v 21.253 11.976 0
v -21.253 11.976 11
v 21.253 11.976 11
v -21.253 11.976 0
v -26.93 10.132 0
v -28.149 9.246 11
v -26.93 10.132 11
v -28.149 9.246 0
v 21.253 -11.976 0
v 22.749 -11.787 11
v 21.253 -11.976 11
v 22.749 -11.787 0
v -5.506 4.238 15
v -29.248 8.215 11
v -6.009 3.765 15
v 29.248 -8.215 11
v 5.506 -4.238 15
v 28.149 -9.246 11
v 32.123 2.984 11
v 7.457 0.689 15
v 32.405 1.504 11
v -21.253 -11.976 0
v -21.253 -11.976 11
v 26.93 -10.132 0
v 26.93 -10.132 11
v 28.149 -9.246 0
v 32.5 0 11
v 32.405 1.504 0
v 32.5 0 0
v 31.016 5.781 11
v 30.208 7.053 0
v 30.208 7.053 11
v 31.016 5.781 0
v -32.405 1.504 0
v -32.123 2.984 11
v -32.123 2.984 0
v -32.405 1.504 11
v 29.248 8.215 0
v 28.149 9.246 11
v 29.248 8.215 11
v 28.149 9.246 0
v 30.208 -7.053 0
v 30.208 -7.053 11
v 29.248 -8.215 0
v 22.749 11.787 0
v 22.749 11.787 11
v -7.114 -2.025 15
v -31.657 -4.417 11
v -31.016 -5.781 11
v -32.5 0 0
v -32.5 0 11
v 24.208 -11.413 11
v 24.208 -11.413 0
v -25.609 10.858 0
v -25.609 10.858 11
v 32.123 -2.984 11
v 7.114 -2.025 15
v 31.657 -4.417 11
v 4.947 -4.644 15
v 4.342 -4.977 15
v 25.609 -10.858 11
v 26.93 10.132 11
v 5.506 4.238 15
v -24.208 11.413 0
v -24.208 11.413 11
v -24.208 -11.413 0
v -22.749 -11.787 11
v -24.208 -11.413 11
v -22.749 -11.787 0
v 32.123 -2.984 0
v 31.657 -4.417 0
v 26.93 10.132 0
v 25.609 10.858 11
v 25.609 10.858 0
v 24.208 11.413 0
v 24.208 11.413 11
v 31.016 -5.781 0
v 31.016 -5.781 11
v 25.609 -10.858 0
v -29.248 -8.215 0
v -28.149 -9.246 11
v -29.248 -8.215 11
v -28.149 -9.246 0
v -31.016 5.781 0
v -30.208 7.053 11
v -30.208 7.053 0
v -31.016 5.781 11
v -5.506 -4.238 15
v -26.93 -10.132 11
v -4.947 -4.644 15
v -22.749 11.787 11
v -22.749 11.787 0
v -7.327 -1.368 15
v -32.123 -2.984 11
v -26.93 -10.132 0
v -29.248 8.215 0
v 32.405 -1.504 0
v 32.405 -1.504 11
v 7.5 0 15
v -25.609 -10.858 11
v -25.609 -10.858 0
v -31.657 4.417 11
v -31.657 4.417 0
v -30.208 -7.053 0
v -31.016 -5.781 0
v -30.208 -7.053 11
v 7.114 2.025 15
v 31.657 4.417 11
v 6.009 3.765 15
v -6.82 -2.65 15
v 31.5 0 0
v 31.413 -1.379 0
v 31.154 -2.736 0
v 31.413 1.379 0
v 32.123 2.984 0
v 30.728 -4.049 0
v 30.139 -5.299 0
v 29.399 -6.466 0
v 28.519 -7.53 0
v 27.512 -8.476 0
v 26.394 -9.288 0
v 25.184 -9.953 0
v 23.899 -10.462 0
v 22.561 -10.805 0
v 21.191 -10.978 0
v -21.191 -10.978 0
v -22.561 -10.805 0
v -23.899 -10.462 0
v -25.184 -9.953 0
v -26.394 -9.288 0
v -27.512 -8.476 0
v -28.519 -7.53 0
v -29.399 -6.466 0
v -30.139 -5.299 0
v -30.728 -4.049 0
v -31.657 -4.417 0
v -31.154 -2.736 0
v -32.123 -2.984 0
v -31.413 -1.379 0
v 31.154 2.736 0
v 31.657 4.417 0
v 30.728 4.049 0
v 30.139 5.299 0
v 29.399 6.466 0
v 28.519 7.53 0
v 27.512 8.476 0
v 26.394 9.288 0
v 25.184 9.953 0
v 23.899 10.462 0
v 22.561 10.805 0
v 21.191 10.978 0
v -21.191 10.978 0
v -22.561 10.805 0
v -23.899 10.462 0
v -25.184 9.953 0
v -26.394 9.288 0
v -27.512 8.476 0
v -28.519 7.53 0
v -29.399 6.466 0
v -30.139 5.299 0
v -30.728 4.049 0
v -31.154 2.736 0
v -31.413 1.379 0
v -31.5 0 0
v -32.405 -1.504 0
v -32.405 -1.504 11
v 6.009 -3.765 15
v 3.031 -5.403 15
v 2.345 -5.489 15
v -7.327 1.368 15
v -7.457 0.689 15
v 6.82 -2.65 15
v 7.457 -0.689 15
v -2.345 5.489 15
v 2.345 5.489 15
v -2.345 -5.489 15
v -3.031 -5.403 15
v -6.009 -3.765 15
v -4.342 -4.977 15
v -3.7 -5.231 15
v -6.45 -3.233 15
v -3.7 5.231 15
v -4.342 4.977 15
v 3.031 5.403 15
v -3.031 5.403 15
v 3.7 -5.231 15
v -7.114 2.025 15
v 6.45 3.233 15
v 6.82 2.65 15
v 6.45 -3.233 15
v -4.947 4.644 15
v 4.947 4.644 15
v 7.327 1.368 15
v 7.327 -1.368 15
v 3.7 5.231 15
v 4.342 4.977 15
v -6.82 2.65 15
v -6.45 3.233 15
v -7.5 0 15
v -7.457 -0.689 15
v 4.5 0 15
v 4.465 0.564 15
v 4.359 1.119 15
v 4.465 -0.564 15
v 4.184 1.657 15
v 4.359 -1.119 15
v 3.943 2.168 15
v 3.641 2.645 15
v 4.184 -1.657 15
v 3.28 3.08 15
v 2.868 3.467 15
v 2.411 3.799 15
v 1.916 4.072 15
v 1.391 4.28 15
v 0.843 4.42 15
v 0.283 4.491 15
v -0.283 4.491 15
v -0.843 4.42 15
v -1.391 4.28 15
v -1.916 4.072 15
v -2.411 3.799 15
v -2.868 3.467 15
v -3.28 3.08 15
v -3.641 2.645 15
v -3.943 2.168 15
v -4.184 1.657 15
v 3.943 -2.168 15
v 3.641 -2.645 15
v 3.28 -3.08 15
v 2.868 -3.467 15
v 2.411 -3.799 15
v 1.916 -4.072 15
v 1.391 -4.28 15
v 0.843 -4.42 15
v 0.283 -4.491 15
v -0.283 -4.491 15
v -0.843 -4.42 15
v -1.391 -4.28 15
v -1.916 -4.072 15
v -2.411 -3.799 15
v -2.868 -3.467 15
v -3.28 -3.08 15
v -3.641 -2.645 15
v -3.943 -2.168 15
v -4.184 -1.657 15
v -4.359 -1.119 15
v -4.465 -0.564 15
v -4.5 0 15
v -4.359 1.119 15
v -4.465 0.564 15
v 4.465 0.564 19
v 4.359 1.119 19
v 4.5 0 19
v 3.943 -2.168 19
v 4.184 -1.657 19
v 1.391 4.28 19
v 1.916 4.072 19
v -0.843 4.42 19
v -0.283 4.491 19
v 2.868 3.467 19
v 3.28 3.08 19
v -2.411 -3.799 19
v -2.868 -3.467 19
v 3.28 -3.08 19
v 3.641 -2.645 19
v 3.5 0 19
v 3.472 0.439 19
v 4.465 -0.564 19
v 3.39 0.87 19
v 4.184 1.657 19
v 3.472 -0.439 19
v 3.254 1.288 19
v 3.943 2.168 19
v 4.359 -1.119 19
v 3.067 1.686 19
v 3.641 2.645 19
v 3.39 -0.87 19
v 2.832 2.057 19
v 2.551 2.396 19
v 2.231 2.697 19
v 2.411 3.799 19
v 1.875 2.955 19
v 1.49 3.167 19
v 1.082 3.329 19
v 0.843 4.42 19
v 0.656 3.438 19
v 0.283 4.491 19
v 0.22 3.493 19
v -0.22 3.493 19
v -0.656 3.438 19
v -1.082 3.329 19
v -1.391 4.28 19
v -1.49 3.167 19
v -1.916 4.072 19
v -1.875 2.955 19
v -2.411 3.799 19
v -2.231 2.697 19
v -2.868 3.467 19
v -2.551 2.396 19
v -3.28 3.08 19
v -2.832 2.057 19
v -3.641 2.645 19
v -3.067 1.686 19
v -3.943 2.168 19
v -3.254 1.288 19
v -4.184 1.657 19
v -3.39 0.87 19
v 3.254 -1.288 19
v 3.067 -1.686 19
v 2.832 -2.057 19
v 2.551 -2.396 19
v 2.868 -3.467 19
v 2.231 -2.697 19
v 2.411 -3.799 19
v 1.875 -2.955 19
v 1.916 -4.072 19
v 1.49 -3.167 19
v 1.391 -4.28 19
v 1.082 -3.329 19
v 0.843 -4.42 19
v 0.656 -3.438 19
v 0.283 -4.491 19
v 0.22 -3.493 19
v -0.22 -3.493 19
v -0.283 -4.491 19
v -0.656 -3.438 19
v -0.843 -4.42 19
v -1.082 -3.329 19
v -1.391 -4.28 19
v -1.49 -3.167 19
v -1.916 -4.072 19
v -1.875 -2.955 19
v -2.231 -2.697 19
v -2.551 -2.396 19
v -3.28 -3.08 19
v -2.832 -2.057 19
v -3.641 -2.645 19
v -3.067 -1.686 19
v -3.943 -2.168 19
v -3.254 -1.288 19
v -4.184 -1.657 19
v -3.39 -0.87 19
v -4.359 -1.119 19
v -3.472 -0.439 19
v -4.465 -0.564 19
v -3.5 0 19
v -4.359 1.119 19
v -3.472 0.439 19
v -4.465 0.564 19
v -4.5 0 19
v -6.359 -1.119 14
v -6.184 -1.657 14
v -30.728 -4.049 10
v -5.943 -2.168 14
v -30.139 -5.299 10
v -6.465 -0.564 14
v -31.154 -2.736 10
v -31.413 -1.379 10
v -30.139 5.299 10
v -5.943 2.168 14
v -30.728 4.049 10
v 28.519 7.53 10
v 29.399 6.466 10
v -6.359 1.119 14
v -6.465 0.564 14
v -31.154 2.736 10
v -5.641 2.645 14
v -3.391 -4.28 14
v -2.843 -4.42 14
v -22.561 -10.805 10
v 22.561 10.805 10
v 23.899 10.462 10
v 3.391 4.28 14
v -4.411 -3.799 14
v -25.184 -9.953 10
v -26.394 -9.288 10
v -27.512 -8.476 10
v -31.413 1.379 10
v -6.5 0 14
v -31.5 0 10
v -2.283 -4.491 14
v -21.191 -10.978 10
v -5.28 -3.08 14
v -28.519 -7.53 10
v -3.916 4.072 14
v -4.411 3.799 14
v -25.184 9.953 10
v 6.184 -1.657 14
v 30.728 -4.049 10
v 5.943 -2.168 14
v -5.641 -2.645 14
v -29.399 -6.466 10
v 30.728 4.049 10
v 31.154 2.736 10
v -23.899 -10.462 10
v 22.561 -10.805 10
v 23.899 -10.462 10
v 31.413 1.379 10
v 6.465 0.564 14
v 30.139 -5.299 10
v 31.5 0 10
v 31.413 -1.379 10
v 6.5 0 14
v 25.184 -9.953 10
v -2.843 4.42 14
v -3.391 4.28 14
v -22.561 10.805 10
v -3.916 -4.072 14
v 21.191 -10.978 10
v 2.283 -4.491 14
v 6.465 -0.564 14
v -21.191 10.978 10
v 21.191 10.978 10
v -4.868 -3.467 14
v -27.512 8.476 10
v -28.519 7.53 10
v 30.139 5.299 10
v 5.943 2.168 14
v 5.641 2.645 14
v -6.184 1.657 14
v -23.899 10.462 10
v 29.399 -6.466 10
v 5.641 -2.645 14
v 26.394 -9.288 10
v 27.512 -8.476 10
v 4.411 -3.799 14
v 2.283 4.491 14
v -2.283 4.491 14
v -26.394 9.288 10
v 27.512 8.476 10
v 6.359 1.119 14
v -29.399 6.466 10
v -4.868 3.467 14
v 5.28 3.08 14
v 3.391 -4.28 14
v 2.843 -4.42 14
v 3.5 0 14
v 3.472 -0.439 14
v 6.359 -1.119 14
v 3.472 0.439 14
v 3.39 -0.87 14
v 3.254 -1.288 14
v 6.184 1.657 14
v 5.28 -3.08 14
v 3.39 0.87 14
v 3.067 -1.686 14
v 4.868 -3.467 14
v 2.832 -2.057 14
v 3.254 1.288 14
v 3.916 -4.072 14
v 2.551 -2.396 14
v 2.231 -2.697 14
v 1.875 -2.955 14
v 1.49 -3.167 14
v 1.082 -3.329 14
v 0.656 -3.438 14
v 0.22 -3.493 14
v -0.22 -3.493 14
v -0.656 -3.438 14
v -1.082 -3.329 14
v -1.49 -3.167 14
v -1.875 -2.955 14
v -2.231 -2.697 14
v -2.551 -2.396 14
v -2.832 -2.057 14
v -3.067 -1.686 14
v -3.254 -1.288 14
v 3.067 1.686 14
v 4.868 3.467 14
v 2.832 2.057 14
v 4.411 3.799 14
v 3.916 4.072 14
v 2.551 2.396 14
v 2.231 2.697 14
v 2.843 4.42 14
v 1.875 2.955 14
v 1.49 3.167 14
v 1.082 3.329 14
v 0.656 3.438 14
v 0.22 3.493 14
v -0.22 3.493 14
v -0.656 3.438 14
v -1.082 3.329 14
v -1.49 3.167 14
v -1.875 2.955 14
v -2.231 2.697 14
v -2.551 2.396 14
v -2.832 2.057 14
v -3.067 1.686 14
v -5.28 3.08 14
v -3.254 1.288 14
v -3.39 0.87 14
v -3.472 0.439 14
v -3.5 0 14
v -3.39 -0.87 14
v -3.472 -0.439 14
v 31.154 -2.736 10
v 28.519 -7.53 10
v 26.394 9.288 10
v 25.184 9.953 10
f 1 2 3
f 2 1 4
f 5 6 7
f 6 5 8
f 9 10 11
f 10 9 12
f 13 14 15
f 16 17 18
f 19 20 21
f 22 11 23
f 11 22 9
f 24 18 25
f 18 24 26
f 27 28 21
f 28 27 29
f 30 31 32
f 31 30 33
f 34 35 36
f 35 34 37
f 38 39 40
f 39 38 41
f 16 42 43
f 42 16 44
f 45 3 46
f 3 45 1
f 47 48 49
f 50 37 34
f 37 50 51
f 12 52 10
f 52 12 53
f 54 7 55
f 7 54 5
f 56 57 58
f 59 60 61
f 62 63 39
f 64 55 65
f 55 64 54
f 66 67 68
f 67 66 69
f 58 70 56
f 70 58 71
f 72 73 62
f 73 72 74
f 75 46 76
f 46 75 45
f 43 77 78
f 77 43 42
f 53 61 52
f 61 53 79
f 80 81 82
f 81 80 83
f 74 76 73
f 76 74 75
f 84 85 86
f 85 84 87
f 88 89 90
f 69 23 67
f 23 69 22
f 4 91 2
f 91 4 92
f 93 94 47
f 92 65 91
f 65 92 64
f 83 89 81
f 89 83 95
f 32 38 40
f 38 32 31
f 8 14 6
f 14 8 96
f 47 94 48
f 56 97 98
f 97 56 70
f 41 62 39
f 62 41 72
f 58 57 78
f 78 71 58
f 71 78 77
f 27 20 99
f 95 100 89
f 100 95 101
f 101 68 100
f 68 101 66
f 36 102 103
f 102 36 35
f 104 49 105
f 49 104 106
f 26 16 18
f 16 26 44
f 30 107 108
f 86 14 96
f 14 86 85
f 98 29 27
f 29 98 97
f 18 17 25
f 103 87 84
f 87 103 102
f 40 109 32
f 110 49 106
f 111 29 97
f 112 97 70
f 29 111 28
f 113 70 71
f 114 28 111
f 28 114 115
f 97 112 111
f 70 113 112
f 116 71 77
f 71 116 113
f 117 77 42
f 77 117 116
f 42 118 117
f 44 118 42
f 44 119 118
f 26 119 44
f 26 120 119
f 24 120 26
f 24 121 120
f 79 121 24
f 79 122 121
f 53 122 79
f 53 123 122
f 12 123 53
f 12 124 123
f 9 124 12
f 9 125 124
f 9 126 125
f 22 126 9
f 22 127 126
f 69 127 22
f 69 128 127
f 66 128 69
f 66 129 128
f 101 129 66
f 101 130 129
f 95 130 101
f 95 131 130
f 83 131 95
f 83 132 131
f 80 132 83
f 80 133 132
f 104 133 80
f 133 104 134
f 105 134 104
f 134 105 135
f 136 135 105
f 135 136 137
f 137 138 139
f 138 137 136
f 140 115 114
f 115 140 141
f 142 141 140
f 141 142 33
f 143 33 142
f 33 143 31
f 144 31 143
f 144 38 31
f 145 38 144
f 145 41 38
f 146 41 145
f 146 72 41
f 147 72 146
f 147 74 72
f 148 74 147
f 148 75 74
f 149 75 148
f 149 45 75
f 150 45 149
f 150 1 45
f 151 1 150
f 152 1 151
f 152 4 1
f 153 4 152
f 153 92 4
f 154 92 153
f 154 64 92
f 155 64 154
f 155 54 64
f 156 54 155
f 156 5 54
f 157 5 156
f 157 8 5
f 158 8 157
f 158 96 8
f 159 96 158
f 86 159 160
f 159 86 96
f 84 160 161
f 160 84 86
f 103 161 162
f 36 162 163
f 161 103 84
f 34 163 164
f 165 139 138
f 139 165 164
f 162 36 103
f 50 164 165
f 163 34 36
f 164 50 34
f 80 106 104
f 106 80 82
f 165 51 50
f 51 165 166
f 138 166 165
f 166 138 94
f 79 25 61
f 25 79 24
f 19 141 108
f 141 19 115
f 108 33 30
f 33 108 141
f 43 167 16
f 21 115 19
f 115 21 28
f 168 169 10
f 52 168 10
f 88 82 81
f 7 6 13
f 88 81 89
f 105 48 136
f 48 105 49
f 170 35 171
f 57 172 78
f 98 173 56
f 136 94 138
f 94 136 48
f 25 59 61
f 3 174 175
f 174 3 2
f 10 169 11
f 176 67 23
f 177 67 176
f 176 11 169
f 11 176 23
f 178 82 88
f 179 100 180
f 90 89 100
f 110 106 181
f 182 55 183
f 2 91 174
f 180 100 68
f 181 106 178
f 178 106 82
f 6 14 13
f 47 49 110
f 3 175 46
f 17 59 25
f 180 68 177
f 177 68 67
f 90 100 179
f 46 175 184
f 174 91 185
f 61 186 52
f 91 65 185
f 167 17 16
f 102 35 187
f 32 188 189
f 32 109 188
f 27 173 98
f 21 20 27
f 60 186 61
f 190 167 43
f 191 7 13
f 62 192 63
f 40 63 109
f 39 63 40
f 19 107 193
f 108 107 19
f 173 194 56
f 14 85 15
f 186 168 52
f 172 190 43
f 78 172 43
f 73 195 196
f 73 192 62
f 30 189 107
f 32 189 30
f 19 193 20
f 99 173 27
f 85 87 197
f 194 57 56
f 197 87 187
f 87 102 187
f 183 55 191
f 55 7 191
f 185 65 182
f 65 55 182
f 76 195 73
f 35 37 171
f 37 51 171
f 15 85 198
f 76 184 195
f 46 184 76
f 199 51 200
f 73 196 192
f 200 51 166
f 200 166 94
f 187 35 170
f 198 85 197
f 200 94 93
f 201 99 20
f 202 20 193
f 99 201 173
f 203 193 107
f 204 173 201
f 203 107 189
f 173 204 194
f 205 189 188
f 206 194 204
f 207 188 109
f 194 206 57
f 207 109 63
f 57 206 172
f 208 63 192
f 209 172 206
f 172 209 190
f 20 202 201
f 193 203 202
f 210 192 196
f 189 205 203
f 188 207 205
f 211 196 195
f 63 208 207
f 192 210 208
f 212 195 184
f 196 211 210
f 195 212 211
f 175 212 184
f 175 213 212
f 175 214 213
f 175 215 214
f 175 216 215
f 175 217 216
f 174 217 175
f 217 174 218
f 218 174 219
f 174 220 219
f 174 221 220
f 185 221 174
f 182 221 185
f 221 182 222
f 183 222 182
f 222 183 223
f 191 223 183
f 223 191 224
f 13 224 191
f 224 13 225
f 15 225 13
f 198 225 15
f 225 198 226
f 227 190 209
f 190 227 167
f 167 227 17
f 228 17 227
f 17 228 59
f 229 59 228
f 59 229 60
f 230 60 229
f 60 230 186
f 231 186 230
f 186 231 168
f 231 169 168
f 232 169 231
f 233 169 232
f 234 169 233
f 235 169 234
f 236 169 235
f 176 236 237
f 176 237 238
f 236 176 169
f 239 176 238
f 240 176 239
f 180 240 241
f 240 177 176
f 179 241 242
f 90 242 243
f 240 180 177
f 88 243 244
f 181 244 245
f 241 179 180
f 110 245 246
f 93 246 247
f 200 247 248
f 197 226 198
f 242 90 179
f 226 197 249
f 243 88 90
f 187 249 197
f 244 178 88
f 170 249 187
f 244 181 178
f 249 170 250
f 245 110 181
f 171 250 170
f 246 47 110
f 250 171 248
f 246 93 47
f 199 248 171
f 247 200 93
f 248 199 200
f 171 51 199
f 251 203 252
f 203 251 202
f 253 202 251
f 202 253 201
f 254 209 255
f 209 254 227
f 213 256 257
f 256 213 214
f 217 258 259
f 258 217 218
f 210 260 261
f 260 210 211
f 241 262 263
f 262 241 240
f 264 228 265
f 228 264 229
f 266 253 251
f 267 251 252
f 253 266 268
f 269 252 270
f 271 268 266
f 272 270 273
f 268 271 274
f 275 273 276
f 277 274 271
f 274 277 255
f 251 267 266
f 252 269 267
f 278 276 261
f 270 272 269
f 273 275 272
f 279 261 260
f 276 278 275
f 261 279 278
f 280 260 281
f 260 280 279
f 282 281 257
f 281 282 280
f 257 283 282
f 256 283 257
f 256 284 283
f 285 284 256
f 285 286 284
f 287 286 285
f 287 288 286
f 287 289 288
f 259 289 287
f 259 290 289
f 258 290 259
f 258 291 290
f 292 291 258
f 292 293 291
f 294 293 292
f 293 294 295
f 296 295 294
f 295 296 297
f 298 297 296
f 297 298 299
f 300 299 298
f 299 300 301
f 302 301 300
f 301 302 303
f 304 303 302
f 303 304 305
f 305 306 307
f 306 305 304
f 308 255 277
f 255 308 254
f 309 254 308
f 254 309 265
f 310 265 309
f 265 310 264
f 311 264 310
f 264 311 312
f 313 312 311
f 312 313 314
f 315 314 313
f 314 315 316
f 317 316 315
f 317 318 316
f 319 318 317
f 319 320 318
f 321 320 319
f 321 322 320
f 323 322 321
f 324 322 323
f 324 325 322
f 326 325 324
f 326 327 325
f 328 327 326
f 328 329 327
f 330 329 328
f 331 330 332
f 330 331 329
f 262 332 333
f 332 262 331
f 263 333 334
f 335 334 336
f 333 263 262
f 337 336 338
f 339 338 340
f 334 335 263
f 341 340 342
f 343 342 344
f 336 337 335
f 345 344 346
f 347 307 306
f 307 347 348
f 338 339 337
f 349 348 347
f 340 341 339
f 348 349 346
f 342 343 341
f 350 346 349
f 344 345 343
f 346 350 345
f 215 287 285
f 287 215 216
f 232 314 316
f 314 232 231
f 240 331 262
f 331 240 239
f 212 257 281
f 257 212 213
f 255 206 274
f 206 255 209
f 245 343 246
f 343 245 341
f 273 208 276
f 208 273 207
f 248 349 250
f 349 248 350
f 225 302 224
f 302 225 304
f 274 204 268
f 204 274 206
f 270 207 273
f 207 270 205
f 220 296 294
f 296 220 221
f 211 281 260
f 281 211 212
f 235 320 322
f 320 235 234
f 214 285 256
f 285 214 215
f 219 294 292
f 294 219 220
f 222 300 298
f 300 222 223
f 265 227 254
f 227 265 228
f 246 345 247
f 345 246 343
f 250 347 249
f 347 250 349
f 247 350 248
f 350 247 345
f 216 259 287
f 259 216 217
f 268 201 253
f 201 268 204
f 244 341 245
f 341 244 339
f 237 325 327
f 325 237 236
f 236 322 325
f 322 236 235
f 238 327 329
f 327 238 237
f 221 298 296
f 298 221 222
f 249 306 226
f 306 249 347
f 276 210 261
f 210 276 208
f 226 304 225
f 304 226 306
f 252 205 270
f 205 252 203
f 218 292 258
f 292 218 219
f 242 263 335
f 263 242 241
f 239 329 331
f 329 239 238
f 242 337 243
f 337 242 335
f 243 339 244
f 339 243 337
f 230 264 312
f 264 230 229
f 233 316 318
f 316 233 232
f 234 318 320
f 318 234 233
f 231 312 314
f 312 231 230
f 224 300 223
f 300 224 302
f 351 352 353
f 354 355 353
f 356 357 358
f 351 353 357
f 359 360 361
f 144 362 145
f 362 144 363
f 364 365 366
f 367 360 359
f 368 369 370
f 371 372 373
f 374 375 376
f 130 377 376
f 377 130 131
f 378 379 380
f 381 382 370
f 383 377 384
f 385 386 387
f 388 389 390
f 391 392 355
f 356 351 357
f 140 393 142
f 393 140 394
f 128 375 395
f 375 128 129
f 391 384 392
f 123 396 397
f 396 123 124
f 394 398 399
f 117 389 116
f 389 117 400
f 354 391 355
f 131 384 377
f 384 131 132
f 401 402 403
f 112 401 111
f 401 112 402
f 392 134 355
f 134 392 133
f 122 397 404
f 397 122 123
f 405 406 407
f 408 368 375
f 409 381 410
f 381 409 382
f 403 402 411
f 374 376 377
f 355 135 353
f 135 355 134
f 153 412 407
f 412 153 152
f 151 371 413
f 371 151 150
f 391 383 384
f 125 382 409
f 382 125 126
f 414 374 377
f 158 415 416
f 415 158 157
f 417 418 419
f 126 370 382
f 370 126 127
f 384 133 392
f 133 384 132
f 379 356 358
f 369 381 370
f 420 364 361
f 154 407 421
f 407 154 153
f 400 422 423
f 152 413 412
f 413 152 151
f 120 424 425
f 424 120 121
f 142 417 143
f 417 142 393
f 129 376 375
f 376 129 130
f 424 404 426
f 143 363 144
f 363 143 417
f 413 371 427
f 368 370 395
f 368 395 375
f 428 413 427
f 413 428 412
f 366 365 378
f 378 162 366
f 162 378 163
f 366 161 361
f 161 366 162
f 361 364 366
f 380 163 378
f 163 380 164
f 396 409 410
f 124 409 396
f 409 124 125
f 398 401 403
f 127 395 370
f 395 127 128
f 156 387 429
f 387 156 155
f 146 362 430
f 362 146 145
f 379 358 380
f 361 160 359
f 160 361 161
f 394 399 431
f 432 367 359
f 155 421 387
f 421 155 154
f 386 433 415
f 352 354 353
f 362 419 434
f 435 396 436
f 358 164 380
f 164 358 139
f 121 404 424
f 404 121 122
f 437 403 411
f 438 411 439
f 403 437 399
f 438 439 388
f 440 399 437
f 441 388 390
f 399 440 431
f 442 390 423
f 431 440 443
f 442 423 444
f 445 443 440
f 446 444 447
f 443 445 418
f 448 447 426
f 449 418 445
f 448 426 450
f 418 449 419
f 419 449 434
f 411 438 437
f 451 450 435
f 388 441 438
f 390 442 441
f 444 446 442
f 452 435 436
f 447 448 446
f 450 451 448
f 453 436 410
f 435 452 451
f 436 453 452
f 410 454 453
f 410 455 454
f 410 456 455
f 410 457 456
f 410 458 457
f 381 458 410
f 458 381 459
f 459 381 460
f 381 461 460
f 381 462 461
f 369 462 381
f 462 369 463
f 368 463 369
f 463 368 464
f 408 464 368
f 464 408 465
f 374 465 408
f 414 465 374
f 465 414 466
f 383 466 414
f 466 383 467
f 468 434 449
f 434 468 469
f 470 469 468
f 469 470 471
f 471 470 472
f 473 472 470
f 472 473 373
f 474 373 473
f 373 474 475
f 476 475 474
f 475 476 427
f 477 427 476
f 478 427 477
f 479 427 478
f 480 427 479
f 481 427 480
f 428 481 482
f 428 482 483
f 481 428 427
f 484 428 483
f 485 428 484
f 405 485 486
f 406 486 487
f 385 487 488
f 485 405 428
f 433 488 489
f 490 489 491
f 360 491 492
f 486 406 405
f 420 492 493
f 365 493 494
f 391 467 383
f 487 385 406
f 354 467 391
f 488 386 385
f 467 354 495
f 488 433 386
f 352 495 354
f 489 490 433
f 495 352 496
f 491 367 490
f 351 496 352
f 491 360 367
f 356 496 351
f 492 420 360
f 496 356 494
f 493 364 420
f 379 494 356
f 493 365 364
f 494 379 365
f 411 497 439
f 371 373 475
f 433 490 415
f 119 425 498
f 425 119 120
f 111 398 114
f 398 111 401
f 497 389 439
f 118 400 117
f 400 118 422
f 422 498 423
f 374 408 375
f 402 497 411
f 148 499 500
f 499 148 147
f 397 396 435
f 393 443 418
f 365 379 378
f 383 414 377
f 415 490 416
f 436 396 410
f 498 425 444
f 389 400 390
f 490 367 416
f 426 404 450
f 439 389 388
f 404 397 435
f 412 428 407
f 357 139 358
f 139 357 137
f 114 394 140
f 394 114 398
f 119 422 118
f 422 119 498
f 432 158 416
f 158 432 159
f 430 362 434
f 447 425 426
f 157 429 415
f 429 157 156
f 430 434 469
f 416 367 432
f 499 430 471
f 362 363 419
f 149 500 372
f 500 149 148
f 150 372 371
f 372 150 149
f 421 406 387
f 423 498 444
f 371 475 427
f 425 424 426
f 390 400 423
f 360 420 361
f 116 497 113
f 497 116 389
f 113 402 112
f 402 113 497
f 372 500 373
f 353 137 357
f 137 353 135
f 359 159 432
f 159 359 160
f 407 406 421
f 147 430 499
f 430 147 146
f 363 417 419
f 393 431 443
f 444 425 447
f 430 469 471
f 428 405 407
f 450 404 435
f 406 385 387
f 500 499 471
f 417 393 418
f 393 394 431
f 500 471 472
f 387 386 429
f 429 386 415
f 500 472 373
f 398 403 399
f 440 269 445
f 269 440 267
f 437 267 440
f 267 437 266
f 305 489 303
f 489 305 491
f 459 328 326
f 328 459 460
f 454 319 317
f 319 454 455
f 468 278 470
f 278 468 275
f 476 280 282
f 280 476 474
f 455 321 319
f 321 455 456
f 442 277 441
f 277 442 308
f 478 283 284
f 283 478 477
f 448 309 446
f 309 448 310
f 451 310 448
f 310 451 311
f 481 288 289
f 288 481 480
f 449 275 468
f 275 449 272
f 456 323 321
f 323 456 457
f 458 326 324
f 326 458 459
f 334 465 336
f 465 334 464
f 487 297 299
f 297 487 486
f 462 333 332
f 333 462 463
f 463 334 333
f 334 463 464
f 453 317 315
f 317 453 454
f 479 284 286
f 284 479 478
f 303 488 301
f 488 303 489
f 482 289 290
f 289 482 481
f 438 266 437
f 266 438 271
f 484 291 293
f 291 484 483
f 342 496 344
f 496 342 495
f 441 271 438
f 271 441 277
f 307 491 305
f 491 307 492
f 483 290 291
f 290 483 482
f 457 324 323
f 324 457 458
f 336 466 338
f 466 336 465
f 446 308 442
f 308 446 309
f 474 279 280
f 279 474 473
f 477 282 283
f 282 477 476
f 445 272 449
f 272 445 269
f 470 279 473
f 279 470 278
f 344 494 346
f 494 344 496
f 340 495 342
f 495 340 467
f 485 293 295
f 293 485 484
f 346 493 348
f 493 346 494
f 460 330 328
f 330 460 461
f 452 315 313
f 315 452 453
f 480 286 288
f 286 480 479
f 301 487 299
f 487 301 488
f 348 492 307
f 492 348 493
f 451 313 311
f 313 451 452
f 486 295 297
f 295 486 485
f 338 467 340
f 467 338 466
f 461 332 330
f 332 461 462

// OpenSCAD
WALL_THICKNESS = 1;

CAP_WIDTH = 22;
CAP_LENGTH = 63;
CAP_HEIGHT = 10;

TOP_LENGTH = 13;
TOP_WIDTH = 9;
TOP_HEIGHT = 4;

PORT_OUTER_DIA = TOP_WIDTH;
PORT_INNER_DIA = TOP_WIDTH - 2 * WALL_THICKNESS;
PORT_LENGTH = 5;

$fn = 50;

module bar(width, length, height) {
    hull() {
        translate([-(length-width)/2, 0, 0])
        cylinder(d = width, h = height);


        translate([(length-width)/2, 0, 0])
        cylinder(d = width, h = height);
    }
}

module cap(w1, w2, l1, l2, h1, h2) {
    hull() {
        bar(w1, l1, h1);
        translate([0, 0, h1])
        bar(w2, l2, h2);
    }
}

module port(dia) {
   cylinder(d = dia, h = CAP_HEIGHT + TOP_HEIGHT + PORT_LENGTH);
}

difference() {
    wt = WALL_THICKNESS;
    wt2 = 2 * wt;
    union() {
        cap(CAP_WIDTH + wt2, TOP_WIDTH + wt2, CAP_LENGTH + wt2, TOP_LENGTH + wt2, CAP_HEIGHT + wt, TOP_HEIGHT);
        port(PORT_OUTER_DIA);
    }

        cap(CAP_WIDTH, TOP_WIDTH, CAP_LENGTH, TOP_LENGTH, CAP_HEIGHT, TOP_HEIGHT);
        port(PORT_INNER_DIA);
}
